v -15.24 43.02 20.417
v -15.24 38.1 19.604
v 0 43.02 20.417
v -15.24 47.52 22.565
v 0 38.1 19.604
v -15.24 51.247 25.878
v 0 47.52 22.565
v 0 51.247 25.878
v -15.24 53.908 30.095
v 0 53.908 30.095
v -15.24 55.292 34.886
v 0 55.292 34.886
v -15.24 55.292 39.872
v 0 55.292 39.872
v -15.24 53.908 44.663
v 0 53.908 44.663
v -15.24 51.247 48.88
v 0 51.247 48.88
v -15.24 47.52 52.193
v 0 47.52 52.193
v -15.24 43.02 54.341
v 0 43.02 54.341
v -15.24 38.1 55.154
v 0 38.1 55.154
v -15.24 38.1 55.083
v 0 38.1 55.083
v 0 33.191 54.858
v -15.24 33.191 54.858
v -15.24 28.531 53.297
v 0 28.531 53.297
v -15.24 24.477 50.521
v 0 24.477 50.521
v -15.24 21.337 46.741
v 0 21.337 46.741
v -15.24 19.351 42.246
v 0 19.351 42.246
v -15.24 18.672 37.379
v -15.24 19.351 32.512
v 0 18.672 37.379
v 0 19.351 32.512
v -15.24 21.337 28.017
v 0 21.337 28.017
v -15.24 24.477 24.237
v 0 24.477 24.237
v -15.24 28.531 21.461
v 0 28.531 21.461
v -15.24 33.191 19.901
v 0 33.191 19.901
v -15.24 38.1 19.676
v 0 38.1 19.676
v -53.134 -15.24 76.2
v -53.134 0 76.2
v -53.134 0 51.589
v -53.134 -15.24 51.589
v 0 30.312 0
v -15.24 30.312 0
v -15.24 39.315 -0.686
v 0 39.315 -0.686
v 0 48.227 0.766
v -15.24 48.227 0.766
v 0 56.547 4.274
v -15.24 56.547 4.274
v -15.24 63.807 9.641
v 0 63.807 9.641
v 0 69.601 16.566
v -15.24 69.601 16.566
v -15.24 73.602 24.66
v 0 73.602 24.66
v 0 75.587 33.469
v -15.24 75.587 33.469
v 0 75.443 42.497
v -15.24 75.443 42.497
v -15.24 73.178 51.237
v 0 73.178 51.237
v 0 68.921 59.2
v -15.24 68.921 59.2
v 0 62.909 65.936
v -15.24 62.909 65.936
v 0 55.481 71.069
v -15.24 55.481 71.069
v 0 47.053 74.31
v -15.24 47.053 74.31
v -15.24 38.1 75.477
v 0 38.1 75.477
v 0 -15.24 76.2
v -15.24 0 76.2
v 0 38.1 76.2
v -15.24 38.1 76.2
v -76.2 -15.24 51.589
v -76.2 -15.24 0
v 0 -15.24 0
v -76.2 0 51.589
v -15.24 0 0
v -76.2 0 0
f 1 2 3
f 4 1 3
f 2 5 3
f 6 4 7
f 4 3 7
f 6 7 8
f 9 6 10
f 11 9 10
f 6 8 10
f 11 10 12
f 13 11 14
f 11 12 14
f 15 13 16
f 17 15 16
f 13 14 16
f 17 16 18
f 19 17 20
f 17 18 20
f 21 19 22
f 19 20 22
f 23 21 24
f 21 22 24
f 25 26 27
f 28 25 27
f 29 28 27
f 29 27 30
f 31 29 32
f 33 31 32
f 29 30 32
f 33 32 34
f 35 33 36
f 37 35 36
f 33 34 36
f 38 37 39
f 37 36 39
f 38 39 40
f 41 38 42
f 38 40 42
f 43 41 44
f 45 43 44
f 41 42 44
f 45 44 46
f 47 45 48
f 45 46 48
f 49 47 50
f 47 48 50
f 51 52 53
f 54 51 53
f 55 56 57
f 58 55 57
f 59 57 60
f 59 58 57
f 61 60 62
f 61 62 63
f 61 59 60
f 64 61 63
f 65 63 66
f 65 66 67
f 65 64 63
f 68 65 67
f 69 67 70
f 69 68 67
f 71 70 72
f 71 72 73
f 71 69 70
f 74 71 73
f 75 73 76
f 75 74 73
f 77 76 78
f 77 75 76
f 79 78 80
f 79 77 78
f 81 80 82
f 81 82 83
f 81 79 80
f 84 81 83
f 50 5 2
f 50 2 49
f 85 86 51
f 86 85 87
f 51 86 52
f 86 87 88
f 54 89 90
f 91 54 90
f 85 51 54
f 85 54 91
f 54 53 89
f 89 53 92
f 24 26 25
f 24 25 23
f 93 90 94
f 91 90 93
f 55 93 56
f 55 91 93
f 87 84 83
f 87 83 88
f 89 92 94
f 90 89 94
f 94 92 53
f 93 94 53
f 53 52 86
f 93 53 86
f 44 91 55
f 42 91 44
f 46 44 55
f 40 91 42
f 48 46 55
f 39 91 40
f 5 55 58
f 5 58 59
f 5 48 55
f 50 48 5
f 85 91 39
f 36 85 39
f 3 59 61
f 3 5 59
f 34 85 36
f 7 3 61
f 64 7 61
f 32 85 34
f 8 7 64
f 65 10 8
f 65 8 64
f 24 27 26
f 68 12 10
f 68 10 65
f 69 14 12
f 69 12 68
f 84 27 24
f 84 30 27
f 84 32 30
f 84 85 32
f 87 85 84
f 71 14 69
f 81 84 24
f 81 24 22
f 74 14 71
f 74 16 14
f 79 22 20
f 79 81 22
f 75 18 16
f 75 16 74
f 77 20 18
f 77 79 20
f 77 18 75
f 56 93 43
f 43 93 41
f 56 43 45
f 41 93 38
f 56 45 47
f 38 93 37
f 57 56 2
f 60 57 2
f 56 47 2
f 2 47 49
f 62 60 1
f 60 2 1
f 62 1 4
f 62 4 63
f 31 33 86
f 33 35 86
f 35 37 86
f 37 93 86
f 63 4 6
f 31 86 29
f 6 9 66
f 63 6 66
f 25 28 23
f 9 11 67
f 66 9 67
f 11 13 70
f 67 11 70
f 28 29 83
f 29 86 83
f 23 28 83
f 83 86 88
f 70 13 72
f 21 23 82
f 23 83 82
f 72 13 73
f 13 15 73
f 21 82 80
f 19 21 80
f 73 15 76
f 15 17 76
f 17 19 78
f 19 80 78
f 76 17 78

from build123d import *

# Parameters (mm, degrees)
F1_DEPTH = 15.24
F2_R     = 38.1
F3_DEPTH = 15.24
F4_R     = 17.78
F5_DEPTH = 15.24
F6_W     = 38.1
F6_H     = 76.2
F7_DEPTH = 15.24
F8_R     = 17.78
F9_DEPTH = 15.24


with BuildPart() as f1:
    # F0 (on Front) → F1 (new body)
    with BuildSketch(Plane.XZ):
        Polygon((0, 76.2), (-53.134054, 76.2), (-53.134054, 51.589463), (-76.2, 51.589463), (-76.2, 0), (0, 0), align=None)
    extrude(amount=F1_DEPTH)

    # F2 (on Right) → F3 (join)
    with BuildSketch(Plane.YZ):
        with Locations((37.68811, 37.37919)):
            Circle(F2_R)
    extrude(amount=-F3_DEPTH)

    # F4 (on face) → F5 (cut)
    with BuildSketch(Plane.YZ):
        with Locations((37.68811, 37.37919)):
            Circle(F4_R)
    extrude(amount=-F5_DEPTH, mode=Mode.SUBTRACT)

    # F6 (on Right) → F7 (join)
    with BuildSketch(Plane.YZ):
        with Locations((19.05, 38.1)):
            Rectangle(F6_W, F6_H)
    extrude(amount=-F7_DEPTH)

    # F8 (on face) → F9 (cut)
    with BuildSketch(Plane.YZ):
        with Locations((36.452431, 37.37919)):
            Circle(F8_R)
    extrude(amount=-F9_DEPTH, mode=Mode.SUBTRACT)


solid = f1.part
